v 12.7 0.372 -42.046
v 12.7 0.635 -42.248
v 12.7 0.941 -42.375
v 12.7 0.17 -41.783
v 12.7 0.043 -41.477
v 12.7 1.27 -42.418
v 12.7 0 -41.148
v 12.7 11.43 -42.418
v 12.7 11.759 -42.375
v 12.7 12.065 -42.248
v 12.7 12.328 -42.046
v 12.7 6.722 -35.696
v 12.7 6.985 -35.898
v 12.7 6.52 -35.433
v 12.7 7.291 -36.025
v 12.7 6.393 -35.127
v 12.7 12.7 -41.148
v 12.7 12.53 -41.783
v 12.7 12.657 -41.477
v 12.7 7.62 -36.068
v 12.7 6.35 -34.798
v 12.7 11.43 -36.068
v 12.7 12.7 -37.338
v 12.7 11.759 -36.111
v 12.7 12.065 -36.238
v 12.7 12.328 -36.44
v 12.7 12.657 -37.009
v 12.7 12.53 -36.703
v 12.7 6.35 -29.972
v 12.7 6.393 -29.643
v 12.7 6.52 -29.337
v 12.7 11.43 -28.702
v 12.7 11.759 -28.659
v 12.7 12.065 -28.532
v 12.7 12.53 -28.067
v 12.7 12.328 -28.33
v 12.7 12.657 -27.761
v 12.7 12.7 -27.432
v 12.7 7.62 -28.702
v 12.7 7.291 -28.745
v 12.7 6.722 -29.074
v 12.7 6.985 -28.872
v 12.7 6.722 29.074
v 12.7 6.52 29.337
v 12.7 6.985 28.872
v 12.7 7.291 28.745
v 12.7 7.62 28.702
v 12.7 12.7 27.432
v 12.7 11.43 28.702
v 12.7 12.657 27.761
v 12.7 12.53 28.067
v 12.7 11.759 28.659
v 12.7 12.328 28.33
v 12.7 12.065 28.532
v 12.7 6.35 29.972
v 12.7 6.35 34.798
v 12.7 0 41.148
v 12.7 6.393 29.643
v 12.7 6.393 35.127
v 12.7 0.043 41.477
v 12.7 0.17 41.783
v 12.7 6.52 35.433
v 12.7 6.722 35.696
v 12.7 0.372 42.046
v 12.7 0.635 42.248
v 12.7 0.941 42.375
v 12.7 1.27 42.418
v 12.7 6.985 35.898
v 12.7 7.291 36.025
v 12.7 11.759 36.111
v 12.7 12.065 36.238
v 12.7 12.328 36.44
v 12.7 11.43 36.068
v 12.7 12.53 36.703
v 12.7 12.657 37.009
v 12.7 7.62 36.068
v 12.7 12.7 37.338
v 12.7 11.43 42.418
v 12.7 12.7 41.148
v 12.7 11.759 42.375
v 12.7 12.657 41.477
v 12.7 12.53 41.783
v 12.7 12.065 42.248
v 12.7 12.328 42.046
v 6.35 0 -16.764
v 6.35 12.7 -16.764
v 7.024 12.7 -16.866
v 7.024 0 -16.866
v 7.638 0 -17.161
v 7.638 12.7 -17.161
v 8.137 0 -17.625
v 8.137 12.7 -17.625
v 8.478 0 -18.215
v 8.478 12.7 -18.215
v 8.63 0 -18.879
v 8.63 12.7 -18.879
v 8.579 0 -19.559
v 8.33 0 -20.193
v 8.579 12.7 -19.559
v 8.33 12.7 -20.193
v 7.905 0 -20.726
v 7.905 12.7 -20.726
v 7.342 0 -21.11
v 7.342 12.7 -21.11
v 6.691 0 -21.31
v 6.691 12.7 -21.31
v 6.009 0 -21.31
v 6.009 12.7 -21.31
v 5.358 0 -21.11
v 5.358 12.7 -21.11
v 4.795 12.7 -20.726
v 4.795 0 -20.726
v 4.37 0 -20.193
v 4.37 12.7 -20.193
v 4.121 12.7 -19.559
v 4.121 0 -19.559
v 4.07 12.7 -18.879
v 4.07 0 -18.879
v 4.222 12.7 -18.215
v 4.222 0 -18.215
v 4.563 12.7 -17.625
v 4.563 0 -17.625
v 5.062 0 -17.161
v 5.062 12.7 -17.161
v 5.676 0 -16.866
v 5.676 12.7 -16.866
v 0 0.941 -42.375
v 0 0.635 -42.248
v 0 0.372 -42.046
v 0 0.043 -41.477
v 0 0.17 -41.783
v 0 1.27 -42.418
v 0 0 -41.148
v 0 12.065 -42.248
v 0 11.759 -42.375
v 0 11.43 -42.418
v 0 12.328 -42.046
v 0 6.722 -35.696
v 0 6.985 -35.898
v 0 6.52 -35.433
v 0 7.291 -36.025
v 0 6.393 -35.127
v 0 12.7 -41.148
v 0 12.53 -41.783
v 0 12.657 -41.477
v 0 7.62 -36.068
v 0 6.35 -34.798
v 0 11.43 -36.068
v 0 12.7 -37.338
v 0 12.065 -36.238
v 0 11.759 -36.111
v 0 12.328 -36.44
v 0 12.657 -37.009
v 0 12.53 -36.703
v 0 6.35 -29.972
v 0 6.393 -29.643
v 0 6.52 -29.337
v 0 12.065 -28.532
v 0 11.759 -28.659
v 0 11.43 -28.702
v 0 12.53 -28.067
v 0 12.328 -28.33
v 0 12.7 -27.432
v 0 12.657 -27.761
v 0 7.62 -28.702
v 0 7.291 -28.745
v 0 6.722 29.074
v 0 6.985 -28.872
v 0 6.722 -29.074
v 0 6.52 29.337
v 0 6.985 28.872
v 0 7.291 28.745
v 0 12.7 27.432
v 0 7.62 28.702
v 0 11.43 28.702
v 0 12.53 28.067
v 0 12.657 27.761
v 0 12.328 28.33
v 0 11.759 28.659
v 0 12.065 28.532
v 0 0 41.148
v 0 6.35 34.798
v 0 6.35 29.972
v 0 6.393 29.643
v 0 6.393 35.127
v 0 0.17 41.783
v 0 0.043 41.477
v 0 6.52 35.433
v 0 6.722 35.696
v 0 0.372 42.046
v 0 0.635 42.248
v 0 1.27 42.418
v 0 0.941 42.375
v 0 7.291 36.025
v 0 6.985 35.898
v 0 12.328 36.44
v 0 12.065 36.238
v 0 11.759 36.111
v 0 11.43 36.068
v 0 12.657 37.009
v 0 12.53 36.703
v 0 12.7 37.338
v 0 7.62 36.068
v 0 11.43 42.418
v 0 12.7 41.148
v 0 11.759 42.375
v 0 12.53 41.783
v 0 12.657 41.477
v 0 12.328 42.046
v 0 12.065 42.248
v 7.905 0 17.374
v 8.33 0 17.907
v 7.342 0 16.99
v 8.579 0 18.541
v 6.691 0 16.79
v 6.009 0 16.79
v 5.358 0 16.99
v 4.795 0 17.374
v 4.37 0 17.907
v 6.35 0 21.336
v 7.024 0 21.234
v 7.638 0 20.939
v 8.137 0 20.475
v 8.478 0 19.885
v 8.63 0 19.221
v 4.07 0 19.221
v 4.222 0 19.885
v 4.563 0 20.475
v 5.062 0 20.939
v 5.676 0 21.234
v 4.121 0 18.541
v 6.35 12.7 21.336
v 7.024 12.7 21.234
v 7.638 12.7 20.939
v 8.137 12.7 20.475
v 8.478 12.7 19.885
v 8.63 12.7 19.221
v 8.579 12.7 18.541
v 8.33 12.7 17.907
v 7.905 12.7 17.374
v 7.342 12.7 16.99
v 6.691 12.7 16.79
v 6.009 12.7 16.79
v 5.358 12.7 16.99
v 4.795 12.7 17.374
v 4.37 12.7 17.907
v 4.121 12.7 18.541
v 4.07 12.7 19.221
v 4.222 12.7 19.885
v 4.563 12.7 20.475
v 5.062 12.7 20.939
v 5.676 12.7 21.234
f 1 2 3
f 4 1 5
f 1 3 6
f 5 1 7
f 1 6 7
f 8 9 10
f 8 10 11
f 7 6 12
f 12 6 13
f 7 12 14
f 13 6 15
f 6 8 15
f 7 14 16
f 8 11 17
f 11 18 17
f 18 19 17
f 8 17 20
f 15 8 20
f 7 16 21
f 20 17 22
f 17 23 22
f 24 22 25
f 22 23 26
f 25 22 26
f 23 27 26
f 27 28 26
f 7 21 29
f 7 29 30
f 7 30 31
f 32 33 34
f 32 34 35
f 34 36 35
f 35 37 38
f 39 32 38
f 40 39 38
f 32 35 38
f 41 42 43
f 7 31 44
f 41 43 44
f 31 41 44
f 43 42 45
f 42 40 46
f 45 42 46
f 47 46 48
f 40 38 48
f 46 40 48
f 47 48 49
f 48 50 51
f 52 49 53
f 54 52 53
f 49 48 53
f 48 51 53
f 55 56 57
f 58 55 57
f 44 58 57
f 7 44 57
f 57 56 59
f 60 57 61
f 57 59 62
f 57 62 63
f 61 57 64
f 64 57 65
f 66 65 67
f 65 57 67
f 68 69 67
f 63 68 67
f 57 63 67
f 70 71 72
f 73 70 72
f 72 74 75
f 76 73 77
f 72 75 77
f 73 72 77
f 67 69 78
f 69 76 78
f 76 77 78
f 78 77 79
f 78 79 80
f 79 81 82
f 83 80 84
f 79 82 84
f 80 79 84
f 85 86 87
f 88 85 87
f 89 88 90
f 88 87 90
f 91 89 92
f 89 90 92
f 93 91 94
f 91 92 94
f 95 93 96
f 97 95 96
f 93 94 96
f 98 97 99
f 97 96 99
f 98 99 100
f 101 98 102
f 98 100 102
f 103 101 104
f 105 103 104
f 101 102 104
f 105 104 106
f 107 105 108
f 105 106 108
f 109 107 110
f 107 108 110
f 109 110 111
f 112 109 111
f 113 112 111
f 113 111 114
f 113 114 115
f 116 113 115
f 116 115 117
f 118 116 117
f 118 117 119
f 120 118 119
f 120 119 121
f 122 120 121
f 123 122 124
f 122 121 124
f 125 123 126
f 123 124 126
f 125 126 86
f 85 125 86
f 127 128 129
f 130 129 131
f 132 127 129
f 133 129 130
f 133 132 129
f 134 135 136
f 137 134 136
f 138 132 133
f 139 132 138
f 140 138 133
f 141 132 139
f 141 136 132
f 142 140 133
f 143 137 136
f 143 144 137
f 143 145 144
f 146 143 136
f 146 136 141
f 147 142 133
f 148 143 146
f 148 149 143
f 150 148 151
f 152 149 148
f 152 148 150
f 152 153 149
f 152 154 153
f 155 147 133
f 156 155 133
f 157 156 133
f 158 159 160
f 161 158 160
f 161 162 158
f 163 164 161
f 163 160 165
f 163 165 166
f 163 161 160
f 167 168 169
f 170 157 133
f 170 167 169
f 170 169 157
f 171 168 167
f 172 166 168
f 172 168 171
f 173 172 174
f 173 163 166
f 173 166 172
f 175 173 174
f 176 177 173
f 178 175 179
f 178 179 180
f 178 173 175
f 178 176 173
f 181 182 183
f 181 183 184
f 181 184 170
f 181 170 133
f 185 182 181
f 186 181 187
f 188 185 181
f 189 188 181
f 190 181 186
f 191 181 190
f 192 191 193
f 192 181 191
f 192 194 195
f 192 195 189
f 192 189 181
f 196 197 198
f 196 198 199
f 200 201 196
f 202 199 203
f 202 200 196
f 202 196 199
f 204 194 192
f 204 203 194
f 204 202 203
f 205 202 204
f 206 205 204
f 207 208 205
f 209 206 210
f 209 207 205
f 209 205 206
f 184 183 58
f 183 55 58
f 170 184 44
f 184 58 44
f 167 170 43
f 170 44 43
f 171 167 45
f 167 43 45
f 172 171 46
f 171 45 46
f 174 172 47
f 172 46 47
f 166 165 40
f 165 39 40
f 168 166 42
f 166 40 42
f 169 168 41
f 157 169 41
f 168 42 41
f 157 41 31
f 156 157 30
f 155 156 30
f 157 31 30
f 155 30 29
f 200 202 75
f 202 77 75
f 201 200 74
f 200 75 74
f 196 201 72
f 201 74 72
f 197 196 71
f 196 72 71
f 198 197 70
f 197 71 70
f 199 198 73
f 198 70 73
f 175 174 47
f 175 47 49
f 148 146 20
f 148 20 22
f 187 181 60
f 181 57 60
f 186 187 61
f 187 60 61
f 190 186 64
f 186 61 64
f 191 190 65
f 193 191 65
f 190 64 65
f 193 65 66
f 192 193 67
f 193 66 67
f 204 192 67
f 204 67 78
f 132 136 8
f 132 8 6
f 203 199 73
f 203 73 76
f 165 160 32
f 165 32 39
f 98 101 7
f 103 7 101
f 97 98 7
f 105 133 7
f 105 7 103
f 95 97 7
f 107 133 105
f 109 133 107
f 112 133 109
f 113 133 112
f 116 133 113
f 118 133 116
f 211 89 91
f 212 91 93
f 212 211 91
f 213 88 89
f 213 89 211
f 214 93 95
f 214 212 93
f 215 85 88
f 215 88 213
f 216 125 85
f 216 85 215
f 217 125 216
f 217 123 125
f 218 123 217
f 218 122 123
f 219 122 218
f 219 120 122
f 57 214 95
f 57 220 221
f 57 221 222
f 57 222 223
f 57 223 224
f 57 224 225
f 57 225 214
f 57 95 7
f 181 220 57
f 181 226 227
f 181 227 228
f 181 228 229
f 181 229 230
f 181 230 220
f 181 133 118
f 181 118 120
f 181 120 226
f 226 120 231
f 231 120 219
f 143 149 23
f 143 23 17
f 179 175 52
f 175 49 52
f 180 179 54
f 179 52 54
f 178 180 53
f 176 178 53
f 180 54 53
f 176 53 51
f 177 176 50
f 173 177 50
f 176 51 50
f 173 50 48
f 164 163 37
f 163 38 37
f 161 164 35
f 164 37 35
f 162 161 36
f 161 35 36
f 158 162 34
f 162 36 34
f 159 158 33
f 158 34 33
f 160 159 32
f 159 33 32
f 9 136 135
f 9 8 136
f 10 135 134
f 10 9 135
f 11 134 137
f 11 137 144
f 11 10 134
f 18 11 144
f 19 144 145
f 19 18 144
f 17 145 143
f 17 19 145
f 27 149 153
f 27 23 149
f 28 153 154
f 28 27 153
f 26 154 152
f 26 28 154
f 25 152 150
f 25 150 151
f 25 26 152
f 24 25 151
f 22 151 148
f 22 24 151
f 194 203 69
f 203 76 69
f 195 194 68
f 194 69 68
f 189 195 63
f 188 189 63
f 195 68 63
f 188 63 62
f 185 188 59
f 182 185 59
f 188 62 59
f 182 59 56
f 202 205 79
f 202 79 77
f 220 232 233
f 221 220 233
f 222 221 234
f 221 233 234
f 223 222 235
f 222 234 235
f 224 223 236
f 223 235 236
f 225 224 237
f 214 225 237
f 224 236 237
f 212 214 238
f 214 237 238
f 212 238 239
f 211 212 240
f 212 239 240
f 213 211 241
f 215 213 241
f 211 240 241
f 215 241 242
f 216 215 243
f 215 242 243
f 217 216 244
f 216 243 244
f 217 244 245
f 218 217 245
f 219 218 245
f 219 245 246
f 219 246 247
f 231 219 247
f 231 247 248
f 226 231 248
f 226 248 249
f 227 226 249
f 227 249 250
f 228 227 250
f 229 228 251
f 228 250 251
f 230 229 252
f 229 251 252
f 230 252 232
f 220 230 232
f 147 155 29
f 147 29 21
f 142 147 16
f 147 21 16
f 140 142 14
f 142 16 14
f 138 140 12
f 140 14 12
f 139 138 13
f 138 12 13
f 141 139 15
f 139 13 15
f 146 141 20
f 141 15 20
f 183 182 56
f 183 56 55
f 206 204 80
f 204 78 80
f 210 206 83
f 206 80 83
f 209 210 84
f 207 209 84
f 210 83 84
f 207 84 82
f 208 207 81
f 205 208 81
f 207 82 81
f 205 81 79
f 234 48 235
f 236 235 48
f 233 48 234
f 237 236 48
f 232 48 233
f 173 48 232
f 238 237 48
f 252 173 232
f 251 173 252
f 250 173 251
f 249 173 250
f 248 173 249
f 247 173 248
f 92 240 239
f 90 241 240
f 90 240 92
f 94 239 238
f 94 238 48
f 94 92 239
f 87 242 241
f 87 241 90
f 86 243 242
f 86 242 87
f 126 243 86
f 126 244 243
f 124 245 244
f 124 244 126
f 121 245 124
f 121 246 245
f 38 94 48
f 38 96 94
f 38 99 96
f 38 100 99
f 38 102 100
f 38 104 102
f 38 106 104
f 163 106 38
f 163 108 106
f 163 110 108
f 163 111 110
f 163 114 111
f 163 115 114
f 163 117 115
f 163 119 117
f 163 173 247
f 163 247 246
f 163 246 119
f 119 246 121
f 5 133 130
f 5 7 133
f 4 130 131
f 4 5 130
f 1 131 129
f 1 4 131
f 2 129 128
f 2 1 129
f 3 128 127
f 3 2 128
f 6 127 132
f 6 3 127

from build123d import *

# Parameters (mm, degrees)
BOSS_EXTRUDE1_DEPTH = 12.7
SKETCH2_R           = 2.286
CUT_EXTRUDE1_DEPTH  = 12.7
FILLET1_R           = 1.27


with BuildPart() as part:
    # Sketch1 → Boss-Extrude1 (new body)
    with BuildSketch(Plane(origin=(0, 0, 0), x_dir=(0, 0, -1), z_dir=(1, 0, 0))):
        Polygon((42.418, 0), (-42.418, 0), (-42.418, 12.7), (-36.068, 12.7), (-36.068, 6.35), (-28.702, 6.35), (-28.702, 12.7), (28.702, 12.7), (28.702, 6.35), (36.068, 6.35), (36.068, 12.7), (42.418, 12.7), align=None)
    extrude(amount=BOSS_EXTRUDE1_DEPTH)

    # Sketch2 → Cut-Extrude1 (cut)
    with BuildSketch(Plane(origin=(0, 12.7, 0), x_dir=(1, 0, 0), z_dir=(0, 1, 0))):
        with Locations(Location((6.35, -19.05, 0), (0, 0, 270))):
            Circle(SKETCH2_R)
        with Locations(Location((6.35, 19.05, 0), (0, 0, 270))):
            Circle(SKETCH2_R)
    extrude(amount=-CUT_EXTRUDE1_DEPTH, mode=Mode.SUBTRACT)

    # Fillet1
    fillet1_edges = [part.edges().sort_by_distance(p)[0] for p in [
        (6.35, 12.7, 42.418),
        (6.35, 12.7, 36.068),
        (6.35, 6.35, 36.068),
        (6.35, 6.35, 28.702),
        (6.35, 12.7, 28.702),
        (6.35, 12.7, -28.702),
        (6.35, 6.35, -28.702),
        (6.35, 6.35, -36.068),
        (6.35, 12.7, -36.068),
        (6.35, 12.7, -42.418),
        (6.35, 0, -42.418),
        (6.35, 0, 42.418),
    ]]
    fillet(fillet1_edges, radius=FILLET1_R)


solid = part.part
